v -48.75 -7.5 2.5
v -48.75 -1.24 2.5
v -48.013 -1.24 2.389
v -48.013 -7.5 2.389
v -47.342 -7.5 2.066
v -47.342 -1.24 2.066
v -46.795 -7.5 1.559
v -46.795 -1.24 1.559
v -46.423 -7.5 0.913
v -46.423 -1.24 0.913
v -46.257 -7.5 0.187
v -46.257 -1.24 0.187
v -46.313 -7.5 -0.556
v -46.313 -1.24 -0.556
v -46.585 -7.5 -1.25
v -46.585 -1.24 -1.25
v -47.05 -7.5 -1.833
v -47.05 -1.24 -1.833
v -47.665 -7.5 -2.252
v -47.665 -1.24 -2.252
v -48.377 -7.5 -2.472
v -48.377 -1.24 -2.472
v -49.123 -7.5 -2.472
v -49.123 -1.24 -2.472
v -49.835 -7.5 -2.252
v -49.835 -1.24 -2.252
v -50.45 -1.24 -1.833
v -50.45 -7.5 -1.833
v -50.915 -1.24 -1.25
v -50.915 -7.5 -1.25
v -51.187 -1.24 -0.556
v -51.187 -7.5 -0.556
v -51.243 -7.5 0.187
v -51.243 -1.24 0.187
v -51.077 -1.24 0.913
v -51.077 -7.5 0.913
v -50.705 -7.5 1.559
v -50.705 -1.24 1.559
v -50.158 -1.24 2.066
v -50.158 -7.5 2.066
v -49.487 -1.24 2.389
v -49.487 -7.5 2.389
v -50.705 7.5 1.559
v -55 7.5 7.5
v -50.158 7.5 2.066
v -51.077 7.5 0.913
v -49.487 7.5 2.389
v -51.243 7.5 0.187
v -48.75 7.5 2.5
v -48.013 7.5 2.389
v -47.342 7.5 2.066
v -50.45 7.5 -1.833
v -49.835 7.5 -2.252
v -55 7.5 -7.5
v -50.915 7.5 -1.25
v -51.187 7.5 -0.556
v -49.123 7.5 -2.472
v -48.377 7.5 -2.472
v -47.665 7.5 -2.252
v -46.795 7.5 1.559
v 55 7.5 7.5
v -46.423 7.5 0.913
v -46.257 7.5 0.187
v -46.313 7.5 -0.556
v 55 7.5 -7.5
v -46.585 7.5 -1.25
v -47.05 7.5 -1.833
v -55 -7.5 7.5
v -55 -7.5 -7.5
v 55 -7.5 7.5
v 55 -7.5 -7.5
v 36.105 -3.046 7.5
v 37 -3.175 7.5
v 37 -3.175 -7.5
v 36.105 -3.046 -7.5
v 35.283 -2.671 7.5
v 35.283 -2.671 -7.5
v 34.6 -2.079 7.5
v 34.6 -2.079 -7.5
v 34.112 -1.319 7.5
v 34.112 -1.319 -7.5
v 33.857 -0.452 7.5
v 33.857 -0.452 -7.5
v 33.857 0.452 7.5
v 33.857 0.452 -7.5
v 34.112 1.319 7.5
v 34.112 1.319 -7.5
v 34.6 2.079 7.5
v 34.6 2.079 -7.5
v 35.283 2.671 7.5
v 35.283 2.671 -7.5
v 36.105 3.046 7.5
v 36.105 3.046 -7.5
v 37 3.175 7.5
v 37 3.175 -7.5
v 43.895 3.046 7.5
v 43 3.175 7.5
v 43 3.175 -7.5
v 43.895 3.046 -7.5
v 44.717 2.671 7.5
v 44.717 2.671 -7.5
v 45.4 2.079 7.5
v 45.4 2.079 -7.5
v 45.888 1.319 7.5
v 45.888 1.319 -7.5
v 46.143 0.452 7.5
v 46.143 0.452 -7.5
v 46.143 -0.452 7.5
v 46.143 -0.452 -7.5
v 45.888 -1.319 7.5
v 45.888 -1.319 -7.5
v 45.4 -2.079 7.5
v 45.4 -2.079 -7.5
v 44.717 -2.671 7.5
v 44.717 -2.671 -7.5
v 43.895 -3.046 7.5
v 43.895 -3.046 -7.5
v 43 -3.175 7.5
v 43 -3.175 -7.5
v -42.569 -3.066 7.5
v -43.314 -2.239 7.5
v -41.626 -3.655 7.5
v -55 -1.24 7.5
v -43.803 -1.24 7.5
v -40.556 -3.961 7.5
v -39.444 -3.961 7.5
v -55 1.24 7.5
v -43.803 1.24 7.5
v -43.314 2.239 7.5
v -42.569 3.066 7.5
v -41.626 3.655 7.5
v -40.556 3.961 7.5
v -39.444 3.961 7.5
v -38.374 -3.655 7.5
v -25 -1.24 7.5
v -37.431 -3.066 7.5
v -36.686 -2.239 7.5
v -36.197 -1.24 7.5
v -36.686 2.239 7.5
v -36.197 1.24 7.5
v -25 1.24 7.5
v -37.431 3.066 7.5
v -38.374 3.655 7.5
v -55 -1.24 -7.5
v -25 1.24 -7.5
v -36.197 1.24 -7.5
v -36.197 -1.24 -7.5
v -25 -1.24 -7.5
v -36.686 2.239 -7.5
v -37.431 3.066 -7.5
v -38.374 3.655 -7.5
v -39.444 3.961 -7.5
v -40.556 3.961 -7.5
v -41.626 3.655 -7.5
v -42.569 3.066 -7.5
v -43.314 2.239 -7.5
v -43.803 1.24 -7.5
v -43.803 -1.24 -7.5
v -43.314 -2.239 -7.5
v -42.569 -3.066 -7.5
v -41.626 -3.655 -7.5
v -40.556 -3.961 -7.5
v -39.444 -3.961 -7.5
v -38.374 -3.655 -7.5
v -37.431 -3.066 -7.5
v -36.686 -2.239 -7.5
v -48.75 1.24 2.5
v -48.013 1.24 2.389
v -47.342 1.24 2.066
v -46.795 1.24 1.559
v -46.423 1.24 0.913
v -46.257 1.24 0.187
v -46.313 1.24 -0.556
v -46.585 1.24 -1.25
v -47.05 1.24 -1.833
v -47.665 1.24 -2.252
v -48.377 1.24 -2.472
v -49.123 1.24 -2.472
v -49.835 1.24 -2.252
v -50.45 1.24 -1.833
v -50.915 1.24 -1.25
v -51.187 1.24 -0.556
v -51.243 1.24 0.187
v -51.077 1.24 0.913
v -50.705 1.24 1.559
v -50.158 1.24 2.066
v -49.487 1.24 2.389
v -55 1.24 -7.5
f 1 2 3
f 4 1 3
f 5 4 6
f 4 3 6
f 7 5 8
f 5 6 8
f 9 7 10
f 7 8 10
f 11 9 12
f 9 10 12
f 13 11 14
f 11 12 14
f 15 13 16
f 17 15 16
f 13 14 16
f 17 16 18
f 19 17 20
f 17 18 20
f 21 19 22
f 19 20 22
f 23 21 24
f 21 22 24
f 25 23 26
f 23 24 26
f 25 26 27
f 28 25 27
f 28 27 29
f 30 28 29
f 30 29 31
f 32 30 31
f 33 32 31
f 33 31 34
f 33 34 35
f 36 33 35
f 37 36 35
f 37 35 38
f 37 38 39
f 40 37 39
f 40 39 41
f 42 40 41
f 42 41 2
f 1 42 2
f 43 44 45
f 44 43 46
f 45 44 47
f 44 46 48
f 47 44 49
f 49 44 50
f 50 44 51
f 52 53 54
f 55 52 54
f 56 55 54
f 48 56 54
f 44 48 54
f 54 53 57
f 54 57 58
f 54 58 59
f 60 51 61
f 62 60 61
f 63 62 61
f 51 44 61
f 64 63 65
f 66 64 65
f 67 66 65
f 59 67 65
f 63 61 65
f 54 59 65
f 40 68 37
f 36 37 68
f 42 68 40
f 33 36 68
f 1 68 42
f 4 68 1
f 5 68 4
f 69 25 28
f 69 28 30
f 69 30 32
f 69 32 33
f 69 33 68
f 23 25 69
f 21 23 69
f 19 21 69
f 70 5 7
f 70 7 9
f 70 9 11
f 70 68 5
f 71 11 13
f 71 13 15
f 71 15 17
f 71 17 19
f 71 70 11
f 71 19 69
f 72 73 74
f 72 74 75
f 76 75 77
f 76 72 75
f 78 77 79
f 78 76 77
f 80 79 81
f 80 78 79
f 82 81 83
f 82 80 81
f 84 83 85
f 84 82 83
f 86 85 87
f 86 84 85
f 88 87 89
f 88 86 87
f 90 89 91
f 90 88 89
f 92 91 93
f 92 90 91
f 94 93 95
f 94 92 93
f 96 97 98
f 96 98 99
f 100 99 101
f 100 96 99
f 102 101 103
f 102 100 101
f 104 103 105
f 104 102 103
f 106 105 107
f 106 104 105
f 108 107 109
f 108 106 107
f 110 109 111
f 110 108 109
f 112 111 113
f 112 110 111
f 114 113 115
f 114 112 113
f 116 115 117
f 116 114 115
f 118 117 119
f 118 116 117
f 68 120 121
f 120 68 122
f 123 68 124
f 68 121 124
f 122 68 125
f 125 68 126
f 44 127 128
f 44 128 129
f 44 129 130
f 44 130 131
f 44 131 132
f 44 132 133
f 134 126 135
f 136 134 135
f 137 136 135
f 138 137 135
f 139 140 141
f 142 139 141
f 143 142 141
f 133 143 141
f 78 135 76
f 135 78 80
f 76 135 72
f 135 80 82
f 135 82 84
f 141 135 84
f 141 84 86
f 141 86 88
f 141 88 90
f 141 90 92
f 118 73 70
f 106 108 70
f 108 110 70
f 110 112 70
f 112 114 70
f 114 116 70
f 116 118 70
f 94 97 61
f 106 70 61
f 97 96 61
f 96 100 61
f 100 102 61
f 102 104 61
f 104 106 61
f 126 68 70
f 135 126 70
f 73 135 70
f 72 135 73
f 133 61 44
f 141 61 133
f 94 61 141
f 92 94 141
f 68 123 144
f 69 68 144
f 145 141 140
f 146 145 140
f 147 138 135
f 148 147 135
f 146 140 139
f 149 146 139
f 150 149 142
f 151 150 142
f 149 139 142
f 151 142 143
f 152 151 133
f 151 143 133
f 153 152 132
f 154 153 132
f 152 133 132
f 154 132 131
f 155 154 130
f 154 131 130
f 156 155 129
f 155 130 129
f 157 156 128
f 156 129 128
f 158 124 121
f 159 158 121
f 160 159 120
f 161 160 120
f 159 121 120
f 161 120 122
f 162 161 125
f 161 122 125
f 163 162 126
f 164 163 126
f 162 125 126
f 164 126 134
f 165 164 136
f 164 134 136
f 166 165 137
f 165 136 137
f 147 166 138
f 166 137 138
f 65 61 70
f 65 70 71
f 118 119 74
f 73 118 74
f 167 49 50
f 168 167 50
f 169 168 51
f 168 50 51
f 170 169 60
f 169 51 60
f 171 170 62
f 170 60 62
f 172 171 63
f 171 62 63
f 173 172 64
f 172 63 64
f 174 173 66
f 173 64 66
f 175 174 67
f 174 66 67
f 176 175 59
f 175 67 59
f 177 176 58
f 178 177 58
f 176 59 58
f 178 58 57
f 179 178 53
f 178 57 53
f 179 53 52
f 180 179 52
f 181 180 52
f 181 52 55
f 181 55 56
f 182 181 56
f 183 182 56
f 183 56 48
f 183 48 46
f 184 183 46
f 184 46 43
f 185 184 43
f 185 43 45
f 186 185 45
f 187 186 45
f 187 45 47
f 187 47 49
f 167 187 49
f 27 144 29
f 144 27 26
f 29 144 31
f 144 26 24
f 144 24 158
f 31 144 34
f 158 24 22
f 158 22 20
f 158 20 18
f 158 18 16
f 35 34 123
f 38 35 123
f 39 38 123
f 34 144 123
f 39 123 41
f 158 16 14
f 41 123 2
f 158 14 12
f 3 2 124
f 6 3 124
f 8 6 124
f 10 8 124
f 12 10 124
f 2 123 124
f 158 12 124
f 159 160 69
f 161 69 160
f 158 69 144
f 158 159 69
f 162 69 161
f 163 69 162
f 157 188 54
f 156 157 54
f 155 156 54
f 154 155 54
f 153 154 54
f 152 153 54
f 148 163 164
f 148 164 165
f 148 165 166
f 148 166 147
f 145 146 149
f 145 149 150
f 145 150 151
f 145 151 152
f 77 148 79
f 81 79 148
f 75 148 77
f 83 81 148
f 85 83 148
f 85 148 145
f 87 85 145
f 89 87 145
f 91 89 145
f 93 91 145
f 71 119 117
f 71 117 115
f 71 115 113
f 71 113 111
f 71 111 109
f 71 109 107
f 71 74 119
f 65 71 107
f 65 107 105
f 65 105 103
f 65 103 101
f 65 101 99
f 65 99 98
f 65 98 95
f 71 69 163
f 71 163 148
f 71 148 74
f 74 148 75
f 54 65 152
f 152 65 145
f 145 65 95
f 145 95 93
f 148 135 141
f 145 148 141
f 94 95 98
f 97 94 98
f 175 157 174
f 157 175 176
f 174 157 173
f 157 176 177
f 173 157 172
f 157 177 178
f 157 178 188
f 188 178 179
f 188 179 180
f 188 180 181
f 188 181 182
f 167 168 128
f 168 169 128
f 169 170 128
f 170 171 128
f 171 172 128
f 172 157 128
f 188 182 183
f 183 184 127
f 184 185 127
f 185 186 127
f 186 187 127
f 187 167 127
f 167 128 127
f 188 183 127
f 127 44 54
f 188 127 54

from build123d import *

# Parameters (mm, degrees)
CROQUIS1_W              = 15
CROQUIS1_H              = 15
SALIENTE_EXTRUIR1_DEPTH = 55
CORTAR_EXTRUIR1_DEPTH   = 58.5
CROQUIS3_R              = 2.5
CORTAR_EXTRUIR2_DEPTH   = 58.5
CORTAR_EXTRUIR3_DEPTH   = 58.5


with BuildPart() as part:
    # Croquis1 → Saliente-Extruir1 (new, symmetric)
    with BuildSketch(Plane(origin=(0, 0, 0), x_dir=(0, 0, -1), z_dir=(1, 0, 0))):
        Rectangle(CROQUIS1_W, CROQUIS1_H)
    extrude(amount=SALIENTE_EXTRUIR1_DEPTH, both=True)

    # Croquis2 → Cortar-Extruir1 (cut, through all)
    with BuildSketch(Plane.XY.offset(7.5)):
        with BuildLine():
            ThreePointArc((-43.802977877, -1.239902926), (-40, -4), (-36.197022123, -1.239902926))
            Line((-36.197022123, -1.239902926), (-43.802977877, -1.239902926))
        make_face()
        with BuildLine():
            Line((-43.802977877, -1.239902926), (-36.197022123, -1.239902926))
            ThreePointArc((-36.197022123, -1.239902926), (-36.049562587, -0.627729437), (-36, 0))
            ThreePointArc((-36, 0), (-36.049562587, 0.627729437), (-36.197022123, 1.239902926))
            Line((-36.197022123, 1.239902926), (-43.802977877, 1.239902926))
            ThreePointArc((-43.802977877, 1.239902926), (-44, 0), (-43.802977877, -1.239902926))
        make_face()
        with BuildLine():
            Line((-43.802977877, 1.239902926), (-36.197022123, 1.239902926))
            ThreePointArc((-36.197022123, 1.239902926), (-40, 4), (-43.802977877, 1.239902926))
        make_face()
        with BuildLine():
            Line((-36.197022123, -1.239902926), (-25, -1.239902926))
            Line((-25, -1.239902926), (-25, 1.239902926))
            Line((-25, 1.239902926), (-36.197022123, 1.239902926))
            ThreePointArc((-36.197022123, 1.239902926), (-36.049562587, 0.627729437), (-36, 0))
            ThreePointArc((-36, 0), (-36.049562587, -0.627729437), (-36.197022123, -1.239902926))
        make_face()
        with BuildLine():
            Line((-55, -1.239902926), (-43.802977877, -1.239902926))
            ThreePointArc((-43.802977877, -1.239902926), (-44, 0), (-43.802977877, 1.239902926))
            Line((-43.802977877, 1.239902926), (-55, 1.239902926))
            Line((-55, 1.239902926), (-55, -1.239902926))
        make_face()
    extrude(amount=-CORTAR_EXTRUIR1_DEPTH, mode=Mode.SUBTRACT)

    # Croquis3 → Cortar-Extruir2 (cut, through all)
    with BuildSketch(Plane(origin=(0, 7.5, 0), x_dir=(1, 0, 0), z_dir=(0, 1, 0))):
        with Locations(Location((-48.75, 0, 0), (0, 0, 270))):
            Circle(CROQUIS3_R)
    extrude(amount=-CORTAR_EXTRUIR2_DEPTH, mode=Mode.SUBTRACT)

    # Croquis4 → Cortar-Extruir3 (cut, through all)
    with BuildSketch(Plane.XY.offset(7.5)):
        with BuildLine():
            Line((37, 3.175), (43, 3.175))
            ThreePointArc((43, 3.175), (46.175, 0), (43, -3.175))
            Line((43, -3.175), (37, -3.175))
            ThreePointArc((37, -3.175), (33.825, 0), (37, 3.175))
        make_face()
    extrude(amount=-CORTAR_EXTRUIR3_DEPTH, mode=Mode.SUBTRACT)


solid = part.part
